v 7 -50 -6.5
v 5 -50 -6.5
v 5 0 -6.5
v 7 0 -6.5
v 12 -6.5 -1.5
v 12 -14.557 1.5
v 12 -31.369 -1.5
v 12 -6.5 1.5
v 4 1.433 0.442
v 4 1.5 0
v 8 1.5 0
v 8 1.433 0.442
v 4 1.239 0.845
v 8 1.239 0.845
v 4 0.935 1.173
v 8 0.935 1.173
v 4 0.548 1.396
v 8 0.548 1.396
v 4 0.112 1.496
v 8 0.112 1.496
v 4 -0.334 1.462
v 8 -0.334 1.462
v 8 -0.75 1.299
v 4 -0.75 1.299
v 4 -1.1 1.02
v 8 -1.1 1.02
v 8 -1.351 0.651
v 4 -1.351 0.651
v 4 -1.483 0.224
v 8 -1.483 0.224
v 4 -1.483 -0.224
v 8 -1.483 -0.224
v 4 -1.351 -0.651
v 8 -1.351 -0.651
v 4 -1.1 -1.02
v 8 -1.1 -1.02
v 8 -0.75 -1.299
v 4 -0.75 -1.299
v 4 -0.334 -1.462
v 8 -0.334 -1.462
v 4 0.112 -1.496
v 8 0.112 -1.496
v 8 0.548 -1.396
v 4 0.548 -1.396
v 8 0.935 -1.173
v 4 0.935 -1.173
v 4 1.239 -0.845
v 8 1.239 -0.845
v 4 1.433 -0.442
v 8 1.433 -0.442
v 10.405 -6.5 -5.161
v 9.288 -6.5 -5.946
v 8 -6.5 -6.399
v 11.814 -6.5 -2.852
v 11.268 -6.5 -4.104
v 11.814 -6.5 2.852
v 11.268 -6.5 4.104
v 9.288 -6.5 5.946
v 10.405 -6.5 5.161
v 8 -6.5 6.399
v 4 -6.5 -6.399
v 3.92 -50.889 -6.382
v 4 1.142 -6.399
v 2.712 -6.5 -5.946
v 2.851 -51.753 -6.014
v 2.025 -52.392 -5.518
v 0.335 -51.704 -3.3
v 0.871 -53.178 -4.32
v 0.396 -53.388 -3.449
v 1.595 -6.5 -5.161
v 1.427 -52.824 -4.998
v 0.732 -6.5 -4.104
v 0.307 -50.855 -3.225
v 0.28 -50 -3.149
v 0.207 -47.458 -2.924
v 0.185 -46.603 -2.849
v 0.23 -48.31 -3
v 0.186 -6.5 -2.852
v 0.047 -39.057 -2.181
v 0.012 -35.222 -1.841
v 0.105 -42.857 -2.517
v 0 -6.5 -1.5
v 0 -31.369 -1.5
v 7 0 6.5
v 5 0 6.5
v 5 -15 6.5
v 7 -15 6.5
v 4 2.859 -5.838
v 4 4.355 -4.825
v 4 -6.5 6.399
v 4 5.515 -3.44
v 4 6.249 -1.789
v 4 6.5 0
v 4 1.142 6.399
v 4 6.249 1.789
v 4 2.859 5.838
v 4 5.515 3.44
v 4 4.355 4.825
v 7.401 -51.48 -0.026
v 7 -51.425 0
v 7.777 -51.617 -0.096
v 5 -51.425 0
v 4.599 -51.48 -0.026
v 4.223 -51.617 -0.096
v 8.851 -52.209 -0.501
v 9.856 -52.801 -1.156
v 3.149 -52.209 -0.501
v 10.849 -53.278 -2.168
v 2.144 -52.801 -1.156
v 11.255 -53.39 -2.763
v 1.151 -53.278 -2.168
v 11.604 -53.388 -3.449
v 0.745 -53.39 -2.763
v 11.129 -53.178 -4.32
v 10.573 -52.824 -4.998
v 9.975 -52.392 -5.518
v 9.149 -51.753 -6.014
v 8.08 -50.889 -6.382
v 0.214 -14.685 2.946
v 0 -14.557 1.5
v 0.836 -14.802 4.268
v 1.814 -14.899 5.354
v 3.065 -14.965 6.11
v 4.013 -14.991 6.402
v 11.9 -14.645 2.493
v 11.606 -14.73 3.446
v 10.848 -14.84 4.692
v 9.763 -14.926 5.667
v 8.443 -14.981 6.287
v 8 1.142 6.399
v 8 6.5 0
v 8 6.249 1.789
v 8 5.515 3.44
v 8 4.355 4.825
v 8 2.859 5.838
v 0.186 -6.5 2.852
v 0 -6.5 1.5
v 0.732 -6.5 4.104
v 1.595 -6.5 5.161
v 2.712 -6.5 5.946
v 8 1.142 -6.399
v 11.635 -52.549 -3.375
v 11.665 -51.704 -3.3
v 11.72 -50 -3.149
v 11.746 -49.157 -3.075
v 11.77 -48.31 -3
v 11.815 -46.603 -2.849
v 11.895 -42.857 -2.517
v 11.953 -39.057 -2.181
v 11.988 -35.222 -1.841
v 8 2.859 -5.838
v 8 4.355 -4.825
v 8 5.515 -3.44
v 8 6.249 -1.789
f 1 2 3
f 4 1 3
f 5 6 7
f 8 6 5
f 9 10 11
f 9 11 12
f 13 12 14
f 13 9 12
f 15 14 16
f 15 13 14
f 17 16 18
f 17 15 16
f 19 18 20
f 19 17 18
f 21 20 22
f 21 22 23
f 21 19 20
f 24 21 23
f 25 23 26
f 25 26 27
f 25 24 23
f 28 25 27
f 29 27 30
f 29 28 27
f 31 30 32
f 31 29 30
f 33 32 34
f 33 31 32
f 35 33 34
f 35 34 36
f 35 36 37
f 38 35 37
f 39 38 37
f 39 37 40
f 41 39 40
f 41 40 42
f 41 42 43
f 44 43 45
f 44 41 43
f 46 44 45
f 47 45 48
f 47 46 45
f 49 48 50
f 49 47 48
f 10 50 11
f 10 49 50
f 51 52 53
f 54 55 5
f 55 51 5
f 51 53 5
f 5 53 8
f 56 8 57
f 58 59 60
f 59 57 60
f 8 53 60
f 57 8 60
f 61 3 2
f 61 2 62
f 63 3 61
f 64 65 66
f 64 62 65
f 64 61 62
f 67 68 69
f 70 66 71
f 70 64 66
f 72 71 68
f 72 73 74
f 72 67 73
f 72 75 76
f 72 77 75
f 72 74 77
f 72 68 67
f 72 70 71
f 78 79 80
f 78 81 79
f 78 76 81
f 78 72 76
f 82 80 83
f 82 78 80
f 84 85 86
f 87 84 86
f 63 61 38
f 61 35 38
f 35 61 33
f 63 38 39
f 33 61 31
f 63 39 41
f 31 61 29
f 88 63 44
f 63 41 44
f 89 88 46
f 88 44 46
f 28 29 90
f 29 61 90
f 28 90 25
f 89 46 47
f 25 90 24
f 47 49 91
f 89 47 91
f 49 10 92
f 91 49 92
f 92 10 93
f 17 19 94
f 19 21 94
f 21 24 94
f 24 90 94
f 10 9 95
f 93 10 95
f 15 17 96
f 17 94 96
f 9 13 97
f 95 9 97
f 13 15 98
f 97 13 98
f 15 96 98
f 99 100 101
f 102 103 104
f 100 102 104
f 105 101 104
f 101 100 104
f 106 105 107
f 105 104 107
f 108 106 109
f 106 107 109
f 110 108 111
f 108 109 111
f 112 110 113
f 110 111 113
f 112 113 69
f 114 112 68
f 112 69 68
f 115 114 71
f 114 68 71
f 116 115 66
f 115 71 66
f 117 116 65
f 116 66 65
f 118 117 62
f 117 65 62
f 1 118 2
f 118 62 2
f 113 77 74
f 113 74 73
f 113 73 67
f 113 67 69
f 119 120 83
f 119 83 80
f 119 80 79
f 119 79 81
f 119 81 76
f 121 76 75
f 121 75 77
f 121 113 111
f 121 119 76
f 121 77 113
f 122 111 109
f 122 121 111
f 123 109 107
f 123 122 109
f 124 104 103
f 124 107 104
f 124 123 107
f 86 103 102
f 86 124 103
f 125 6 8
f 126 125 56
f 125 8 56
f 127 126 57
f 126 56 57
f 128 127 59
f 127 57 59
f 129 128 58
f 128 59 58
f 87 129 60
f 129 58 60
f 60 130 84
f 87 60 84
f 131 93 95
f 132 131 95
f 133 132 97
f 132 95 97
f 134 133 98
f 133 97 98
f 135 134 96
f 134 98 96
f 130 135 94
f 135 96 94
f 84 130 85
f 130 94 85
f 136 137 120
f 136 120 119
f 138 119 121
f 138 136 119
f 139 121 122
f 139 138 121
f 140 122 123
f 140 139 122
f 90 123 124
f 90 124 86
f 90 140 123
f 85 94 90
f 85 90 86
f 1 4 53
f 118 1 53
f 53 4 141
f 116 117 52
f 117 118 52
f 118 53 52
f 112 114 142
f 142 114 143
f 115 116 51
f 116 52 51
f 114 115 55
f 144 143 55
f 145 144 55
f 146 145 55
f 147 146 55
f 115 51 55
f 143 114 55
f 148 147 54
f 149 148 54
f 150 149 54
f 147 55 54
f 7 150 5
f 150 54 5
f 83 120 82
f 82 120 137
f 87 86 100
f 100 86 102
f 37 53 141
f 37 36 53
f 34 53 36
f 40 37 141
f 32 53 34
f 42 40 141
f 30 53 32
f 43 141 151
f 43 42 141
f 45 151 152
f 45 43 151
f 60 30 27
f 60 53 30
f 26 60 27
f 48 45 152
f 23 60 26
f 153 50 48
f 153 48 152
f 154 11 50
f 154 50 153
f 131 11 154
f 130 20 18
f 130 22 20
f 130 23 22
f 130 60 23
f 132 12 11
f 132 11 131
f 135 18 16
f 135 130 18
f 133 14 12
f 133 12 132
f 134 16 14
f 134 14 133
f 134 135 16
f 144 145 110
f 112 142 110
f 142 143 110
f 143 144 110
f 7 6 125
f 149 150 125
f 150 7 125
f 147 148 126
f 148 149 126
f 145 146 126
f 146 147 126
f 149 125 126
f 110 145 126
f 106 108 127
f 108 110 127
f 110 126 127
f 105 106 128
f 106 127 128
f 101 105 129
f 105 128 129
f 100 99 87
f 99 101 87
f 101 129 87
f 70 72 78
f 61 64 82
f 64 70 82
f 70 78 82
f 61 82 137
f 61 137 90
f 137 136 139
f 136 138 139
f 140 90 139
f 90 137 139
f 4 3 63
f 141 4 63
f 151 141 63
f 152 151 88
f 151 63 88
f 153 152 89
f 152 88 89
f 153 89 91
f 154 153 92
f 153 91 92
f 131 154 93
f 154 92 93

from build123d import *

# Parameters (mm, degrees)
F1_DEPTH     = 12
F2_START     = 4
F0_R         = 1.5
F2_DEPTH     = 4
F3_T1_DEPTH  = 58.5
F3_T3_DEPTH  = 87
F3_T5_DEPTH  = 68.5
F3_T10_ANGLE = 359.64
F3_S11_R     = 5
F3_T12_DEPTH = 7
F3_T16_ANGLE = 359.64
F3_S17_R     = 5
F3_T18_DEPTH = 7
F3_T22_ANGLE = 359.64
F3_S23_R     = 5
F3_T24_DEPTH = 7
F3_T28_ANGLE = 359.64
F3_S29_R     = 5
F3_T30_DEPTH = 7


# Not quite as in the source:
# - a fillet or chamfer that OpenCascade refuses, or shapes differently, is made with other operations: its cross-section is extruded or revolved along the edge and cut away or added


with BuildPart() as f1:
    # F0 (on Right) → F1 (new body)
    with BuildSketch(Plane.YZ):
        with BuildLine():
            Line((-6.5, -6.5), (-6.5, 0))
            Line((-6.5, 0), (-6.5, 6.5))
            Line((-6.5, 6.5), (-15, 6.5))
            Line((-15, 6.5), (-51.4245796132, 0))
            ThreePointArc((-51.4245796132, 0), (-53.3271394273, -3.8230863787), (-50, -6.5))
            Line((-50, -6.5), (-6.5, -6.5))
        make_face()
    extrude(amount=F1_DEPTH)

    # F0 (on Right) → F2 (join)
    with BuildSketch(Plane.YZ.offset(F2_START)):
        with BuildLine():
            ThreePointArc((0, -6.5), (4.5961940777, -4.5961940777), (6.5, 0))
            ThreePointArc((6.5, 0), (4.5961940777, 4.5961940777), (0, 6.5))
            ThreePointArc((0, 6.5), (-4.5961940777, 4.5961940777), (-6.5, 0))
            ThreePointArc((-6.5, 0), (-4.5961940777, -4.5961940777), (0, -6.5))
        make_face()
        Circle(F0_R, mode=Mode.SUBTRACT)
        with BuildLine():
            ThreePointArc((-6.5, 0), (-4.5961940777, 4.5961940777), (0, 6.5))
            Line((0, 6.5), (-6.5, 6.5))
            Line((-6.5, 6.5), (-6.5, 0))
        make_face()
        with BuildLine():
            Line((-6.5, -6.5), (0, -6.5))
            ThreePointArc((0, -6.5), (-4.5961940777, -4.5961940777), (-6.5, 0))
            Line((-6.5, 0), (-6.5, -6.5))
        make_face()
    extrude(amount=F2_DEPTH)

    # F3: fillet of radius 5 on 6 edges, made by hand

    # F3_s2 → F3_t1 (cut)
    with BuildSketch(Plane.XZ.offset(-6)):
        with BuildLine():
            ThreePointArc((12, 1.5), (10.5355339059, 5.0355339059), (7, 6.5))
            Line((7, 6.5), (12, 6.5))
            Line((12, 6.5), (12, 1.5))
        make_face()
        with BuildLine():
            ThreePointArc((0, 1.5), (1.4644660941, 5.0355339059), (5, 6.5))
            Line((5, 6.5), (0, 6.5))
            Line((0, 6.5), (0, 1.5))
        make_face()
    extrude(amount=F3_T1_DEPTH, mode=Mode.SUBTRACT)

    # F3_s4 → F3_t3 (cut)
    with BuildSketch(Plane(origin=(0, 23.5038661081, 4.1942866966), x_dir=(1, 0, 0), z_dir=(0, -0.9844480977, -0.1756756757))):
        with BuildLine():
            ThreePointArc((12, 4.0340477699), (10.5355339059, 7.5695816758), (7, 9.0340477699))
            Line((7, 9.0340477699), (12, 9.0340477699))
            Line((12, 9.0340477699), (12, 4.0340477699))
        make_face()
        with BuildLine():
            ThreePointArc((0, 4.0340477699), (1.4644660941, 7.5695816758), (5, 9.0340477699))
            Line((5, 9.0340477699), (0, 9.0340477699))
            Line((0, 9.0340477699), (0, 4.0340477699))
        make_face()
    extrude(amount=F3_T3_DEPTH, mode=Mode.SUBTRACT)

    # F3_s6 → F3_t5 (cut)
    with BuildSketch(Plane.XZ.offset(-6)):
        with BuildLine():
            ThreePointArc((5, -6.5), (1.4644660941, -5.0355339059), (0, -1.5))
            Line((0, -1.5), (0, -6.5))
            Line((0, -6.5), (5, -6.5))
        make_face()
        with BuildLine():
            ThreePointArc((7, -6.5), (10.5355339059, -5.0355339059), (12, -1.5))
            Line((12, -1.5), (12, -6.5))
            Line((12, -6.5), (7, -6.5))
        make_face()
    extrude(amount=F3_T5_DEPTH, mode=Mode.SUBTRACT)


with BuildPart() as f3_tool8:
    # F3_s9 → F3_t10 (revolve)
    with BuildSketch(Plane(origin=(0, -50.0174650791, -0.3142731374), x_dir=(1, 0, 0), z_dir=(0, -0.9999802609, -0.006283144))):
        with BuildLine():
            ThreePointArc((7, -6.185781731), (9.9180943161, -5.2459203447), (11.7391469644, -2.779671956))
            Line((11.7391469644, -2.779671956), (12, -2.779671956))
            Line((12, -2.779671956), (12, -6.185781731))
            Line((12, -6.185781731), (7, -6.185781731))
        make_face()
    revolve(axis=Axis((12, -50, -3.093890225), (1, 0, 0)), revolution_arc=F3_T10_ANGLE)

    # F3_s11 → F3_t12 (cut, symmetric)
    with BuildSketch(Plane(origin=(0, -49.0255152632, -8.7486486486), x_dir=(1, 0, 0), z_dir=(0, 0.9844480977, 0.1756756757))):
        with Locations((7, -4.0340477699)):
            Circle(F3_S11_R)
    extrude(amount=F3_T12_DEPTH, both=True, mode=Mode.SUBTRACT)


with BuildPart() as f1_1:
    add(f1.part)

    # F3_t7: cut F3_tool8
    add(f3_tool8.part, mode=Mode.SUBTRACT)


with BuildPart() as f3_tool14:
    # F3_s15 → F3_t16 (revolve)
    with BuildSketch(Plane(origin=(0, -50.0174650791, -0.3142731374), x_dir=(1, 0, 0), z_dir=(0, -0.9999802609, -0.006283144))):
        with BuildLine():
            ThreePointArc((7, -6.185781731), (9.9180943161, -5.2459203447), (11.7391469644, -2.779671956))
            Line((11.7391469644, -2.779671956), (12, -2.779671956))
            Line((12, -2.779671956), (12, -6.185781731))
            Line((12, -6.185781731), (7, -6.185781731))
        make_face()
    revolve(axis=Axis((12, -50, -3.093890225), (1, 0, 0)), revolution_arc=F3_T16_ANGLE)

    # F3_s17 → F3_t18 (cut, symmetric)
    with BuildSketch(Plane.XZ.offset(50)):
        with Locations((7, -1.5)):
            Circle(F3_S17_R)
    extrude(amount=F3_T18_DEPTH, both=True, mode=Mode.SUBTRACT)


with BuildPart() as f1_2:
    add(f1_1.part)

    # F3_t13: cut F3_tool14
    add(f3_tool14.part, mode=Mode.SUBTRACT)


with BuildPart() as f3_tool20:
    # F3_s21 → F3_t22 (revolve)
    with BuildSketch(Plane(origin=(0, -50.0174650791, -0.3142731374), x_dir=(1, 0, 0), z_dir=(0, -0.9999802609, -0.006283144))):
        with BuildLine():
            ThreePointArc((5, -6.185781731), (2.0819056839, -5.2459203447), (0.2608530356, -2.779671956))
            Line((0.2608530356, -2.779671956), (0, -2.779671956))
            Line((0, -2.779671956), (0, -6.185781731))
            Line((0, -6.185781731), (5, -6.185781731))
        make_face()
    revolve(axis=Axis((0, -50, -3.093890225), (1, 0, 0)), revolution_arc=F3_T22_ANGLE)

    # F3_s23 → F3_t24 (cut, symmetric)
    with BuildSketch(Plane(origin=(0, -49.0255152632, -8.7486486486), x_dir=(1, 0, 0), z_dir=(0, 0.9844480977, 0.1756756757))):
        with Locations((5, -4.0340477699)):
            Circle(F3_S23_R)
    extrude(amount=F3_T24_DEPTH, both=True, mode=Mode.SUBTRACT)


with BuildPart() as f1_3:
    add(f1_2.part)

    # F3_t19: cut F3_tool20
    add(f3_tool20.part, mode=Mode.SUBTRACT)


with BuildPart() as f3_tool26:
    # F3_s27 → F3_t28 (revolve)
    with BuildSketch(Plane(origin=(0, -50.0174650791, -0.3142731374), x_dir=(1, 0, 0), z_dir=(0, -0.9999802609, -0.006283144))):
        with BuildLine():
            ThreePointArc((5, -6.185781731), (2.0819056839, -5.2459203447), (0.2608530356, -2.779671956))
            Line((0.2608530356, -2.779671956), (0, -2.779671956))
            Line((0, -2.779671956), (0, -6.185781731))
            Line((0, -6.185781731), (5, -6.185781731))
        make_face()
    revolve(axis=Axis((0, -50, -3.093890225), (1, 0, 0)), revolution_arc=F3_T28_ANGLE)

    # F3_s29 → F3_t30 (cut, symmetric)
    with BuildSketch(Plane.XZ.offset(50)):
        with Locations((5, -1.5)):
            Circle(F3_S29_R)
    extrude(amount=F3_T30_DEPTH, both=True, mode=Mode.SUBTRACT)


with BuildPart() as f1_4:
    add(f1_3.part)

    # F3_t25: cut F3_tool26
    add(f3_tool26.part, mode=Mode.SUBTRACT)


solid = f1_4.part
